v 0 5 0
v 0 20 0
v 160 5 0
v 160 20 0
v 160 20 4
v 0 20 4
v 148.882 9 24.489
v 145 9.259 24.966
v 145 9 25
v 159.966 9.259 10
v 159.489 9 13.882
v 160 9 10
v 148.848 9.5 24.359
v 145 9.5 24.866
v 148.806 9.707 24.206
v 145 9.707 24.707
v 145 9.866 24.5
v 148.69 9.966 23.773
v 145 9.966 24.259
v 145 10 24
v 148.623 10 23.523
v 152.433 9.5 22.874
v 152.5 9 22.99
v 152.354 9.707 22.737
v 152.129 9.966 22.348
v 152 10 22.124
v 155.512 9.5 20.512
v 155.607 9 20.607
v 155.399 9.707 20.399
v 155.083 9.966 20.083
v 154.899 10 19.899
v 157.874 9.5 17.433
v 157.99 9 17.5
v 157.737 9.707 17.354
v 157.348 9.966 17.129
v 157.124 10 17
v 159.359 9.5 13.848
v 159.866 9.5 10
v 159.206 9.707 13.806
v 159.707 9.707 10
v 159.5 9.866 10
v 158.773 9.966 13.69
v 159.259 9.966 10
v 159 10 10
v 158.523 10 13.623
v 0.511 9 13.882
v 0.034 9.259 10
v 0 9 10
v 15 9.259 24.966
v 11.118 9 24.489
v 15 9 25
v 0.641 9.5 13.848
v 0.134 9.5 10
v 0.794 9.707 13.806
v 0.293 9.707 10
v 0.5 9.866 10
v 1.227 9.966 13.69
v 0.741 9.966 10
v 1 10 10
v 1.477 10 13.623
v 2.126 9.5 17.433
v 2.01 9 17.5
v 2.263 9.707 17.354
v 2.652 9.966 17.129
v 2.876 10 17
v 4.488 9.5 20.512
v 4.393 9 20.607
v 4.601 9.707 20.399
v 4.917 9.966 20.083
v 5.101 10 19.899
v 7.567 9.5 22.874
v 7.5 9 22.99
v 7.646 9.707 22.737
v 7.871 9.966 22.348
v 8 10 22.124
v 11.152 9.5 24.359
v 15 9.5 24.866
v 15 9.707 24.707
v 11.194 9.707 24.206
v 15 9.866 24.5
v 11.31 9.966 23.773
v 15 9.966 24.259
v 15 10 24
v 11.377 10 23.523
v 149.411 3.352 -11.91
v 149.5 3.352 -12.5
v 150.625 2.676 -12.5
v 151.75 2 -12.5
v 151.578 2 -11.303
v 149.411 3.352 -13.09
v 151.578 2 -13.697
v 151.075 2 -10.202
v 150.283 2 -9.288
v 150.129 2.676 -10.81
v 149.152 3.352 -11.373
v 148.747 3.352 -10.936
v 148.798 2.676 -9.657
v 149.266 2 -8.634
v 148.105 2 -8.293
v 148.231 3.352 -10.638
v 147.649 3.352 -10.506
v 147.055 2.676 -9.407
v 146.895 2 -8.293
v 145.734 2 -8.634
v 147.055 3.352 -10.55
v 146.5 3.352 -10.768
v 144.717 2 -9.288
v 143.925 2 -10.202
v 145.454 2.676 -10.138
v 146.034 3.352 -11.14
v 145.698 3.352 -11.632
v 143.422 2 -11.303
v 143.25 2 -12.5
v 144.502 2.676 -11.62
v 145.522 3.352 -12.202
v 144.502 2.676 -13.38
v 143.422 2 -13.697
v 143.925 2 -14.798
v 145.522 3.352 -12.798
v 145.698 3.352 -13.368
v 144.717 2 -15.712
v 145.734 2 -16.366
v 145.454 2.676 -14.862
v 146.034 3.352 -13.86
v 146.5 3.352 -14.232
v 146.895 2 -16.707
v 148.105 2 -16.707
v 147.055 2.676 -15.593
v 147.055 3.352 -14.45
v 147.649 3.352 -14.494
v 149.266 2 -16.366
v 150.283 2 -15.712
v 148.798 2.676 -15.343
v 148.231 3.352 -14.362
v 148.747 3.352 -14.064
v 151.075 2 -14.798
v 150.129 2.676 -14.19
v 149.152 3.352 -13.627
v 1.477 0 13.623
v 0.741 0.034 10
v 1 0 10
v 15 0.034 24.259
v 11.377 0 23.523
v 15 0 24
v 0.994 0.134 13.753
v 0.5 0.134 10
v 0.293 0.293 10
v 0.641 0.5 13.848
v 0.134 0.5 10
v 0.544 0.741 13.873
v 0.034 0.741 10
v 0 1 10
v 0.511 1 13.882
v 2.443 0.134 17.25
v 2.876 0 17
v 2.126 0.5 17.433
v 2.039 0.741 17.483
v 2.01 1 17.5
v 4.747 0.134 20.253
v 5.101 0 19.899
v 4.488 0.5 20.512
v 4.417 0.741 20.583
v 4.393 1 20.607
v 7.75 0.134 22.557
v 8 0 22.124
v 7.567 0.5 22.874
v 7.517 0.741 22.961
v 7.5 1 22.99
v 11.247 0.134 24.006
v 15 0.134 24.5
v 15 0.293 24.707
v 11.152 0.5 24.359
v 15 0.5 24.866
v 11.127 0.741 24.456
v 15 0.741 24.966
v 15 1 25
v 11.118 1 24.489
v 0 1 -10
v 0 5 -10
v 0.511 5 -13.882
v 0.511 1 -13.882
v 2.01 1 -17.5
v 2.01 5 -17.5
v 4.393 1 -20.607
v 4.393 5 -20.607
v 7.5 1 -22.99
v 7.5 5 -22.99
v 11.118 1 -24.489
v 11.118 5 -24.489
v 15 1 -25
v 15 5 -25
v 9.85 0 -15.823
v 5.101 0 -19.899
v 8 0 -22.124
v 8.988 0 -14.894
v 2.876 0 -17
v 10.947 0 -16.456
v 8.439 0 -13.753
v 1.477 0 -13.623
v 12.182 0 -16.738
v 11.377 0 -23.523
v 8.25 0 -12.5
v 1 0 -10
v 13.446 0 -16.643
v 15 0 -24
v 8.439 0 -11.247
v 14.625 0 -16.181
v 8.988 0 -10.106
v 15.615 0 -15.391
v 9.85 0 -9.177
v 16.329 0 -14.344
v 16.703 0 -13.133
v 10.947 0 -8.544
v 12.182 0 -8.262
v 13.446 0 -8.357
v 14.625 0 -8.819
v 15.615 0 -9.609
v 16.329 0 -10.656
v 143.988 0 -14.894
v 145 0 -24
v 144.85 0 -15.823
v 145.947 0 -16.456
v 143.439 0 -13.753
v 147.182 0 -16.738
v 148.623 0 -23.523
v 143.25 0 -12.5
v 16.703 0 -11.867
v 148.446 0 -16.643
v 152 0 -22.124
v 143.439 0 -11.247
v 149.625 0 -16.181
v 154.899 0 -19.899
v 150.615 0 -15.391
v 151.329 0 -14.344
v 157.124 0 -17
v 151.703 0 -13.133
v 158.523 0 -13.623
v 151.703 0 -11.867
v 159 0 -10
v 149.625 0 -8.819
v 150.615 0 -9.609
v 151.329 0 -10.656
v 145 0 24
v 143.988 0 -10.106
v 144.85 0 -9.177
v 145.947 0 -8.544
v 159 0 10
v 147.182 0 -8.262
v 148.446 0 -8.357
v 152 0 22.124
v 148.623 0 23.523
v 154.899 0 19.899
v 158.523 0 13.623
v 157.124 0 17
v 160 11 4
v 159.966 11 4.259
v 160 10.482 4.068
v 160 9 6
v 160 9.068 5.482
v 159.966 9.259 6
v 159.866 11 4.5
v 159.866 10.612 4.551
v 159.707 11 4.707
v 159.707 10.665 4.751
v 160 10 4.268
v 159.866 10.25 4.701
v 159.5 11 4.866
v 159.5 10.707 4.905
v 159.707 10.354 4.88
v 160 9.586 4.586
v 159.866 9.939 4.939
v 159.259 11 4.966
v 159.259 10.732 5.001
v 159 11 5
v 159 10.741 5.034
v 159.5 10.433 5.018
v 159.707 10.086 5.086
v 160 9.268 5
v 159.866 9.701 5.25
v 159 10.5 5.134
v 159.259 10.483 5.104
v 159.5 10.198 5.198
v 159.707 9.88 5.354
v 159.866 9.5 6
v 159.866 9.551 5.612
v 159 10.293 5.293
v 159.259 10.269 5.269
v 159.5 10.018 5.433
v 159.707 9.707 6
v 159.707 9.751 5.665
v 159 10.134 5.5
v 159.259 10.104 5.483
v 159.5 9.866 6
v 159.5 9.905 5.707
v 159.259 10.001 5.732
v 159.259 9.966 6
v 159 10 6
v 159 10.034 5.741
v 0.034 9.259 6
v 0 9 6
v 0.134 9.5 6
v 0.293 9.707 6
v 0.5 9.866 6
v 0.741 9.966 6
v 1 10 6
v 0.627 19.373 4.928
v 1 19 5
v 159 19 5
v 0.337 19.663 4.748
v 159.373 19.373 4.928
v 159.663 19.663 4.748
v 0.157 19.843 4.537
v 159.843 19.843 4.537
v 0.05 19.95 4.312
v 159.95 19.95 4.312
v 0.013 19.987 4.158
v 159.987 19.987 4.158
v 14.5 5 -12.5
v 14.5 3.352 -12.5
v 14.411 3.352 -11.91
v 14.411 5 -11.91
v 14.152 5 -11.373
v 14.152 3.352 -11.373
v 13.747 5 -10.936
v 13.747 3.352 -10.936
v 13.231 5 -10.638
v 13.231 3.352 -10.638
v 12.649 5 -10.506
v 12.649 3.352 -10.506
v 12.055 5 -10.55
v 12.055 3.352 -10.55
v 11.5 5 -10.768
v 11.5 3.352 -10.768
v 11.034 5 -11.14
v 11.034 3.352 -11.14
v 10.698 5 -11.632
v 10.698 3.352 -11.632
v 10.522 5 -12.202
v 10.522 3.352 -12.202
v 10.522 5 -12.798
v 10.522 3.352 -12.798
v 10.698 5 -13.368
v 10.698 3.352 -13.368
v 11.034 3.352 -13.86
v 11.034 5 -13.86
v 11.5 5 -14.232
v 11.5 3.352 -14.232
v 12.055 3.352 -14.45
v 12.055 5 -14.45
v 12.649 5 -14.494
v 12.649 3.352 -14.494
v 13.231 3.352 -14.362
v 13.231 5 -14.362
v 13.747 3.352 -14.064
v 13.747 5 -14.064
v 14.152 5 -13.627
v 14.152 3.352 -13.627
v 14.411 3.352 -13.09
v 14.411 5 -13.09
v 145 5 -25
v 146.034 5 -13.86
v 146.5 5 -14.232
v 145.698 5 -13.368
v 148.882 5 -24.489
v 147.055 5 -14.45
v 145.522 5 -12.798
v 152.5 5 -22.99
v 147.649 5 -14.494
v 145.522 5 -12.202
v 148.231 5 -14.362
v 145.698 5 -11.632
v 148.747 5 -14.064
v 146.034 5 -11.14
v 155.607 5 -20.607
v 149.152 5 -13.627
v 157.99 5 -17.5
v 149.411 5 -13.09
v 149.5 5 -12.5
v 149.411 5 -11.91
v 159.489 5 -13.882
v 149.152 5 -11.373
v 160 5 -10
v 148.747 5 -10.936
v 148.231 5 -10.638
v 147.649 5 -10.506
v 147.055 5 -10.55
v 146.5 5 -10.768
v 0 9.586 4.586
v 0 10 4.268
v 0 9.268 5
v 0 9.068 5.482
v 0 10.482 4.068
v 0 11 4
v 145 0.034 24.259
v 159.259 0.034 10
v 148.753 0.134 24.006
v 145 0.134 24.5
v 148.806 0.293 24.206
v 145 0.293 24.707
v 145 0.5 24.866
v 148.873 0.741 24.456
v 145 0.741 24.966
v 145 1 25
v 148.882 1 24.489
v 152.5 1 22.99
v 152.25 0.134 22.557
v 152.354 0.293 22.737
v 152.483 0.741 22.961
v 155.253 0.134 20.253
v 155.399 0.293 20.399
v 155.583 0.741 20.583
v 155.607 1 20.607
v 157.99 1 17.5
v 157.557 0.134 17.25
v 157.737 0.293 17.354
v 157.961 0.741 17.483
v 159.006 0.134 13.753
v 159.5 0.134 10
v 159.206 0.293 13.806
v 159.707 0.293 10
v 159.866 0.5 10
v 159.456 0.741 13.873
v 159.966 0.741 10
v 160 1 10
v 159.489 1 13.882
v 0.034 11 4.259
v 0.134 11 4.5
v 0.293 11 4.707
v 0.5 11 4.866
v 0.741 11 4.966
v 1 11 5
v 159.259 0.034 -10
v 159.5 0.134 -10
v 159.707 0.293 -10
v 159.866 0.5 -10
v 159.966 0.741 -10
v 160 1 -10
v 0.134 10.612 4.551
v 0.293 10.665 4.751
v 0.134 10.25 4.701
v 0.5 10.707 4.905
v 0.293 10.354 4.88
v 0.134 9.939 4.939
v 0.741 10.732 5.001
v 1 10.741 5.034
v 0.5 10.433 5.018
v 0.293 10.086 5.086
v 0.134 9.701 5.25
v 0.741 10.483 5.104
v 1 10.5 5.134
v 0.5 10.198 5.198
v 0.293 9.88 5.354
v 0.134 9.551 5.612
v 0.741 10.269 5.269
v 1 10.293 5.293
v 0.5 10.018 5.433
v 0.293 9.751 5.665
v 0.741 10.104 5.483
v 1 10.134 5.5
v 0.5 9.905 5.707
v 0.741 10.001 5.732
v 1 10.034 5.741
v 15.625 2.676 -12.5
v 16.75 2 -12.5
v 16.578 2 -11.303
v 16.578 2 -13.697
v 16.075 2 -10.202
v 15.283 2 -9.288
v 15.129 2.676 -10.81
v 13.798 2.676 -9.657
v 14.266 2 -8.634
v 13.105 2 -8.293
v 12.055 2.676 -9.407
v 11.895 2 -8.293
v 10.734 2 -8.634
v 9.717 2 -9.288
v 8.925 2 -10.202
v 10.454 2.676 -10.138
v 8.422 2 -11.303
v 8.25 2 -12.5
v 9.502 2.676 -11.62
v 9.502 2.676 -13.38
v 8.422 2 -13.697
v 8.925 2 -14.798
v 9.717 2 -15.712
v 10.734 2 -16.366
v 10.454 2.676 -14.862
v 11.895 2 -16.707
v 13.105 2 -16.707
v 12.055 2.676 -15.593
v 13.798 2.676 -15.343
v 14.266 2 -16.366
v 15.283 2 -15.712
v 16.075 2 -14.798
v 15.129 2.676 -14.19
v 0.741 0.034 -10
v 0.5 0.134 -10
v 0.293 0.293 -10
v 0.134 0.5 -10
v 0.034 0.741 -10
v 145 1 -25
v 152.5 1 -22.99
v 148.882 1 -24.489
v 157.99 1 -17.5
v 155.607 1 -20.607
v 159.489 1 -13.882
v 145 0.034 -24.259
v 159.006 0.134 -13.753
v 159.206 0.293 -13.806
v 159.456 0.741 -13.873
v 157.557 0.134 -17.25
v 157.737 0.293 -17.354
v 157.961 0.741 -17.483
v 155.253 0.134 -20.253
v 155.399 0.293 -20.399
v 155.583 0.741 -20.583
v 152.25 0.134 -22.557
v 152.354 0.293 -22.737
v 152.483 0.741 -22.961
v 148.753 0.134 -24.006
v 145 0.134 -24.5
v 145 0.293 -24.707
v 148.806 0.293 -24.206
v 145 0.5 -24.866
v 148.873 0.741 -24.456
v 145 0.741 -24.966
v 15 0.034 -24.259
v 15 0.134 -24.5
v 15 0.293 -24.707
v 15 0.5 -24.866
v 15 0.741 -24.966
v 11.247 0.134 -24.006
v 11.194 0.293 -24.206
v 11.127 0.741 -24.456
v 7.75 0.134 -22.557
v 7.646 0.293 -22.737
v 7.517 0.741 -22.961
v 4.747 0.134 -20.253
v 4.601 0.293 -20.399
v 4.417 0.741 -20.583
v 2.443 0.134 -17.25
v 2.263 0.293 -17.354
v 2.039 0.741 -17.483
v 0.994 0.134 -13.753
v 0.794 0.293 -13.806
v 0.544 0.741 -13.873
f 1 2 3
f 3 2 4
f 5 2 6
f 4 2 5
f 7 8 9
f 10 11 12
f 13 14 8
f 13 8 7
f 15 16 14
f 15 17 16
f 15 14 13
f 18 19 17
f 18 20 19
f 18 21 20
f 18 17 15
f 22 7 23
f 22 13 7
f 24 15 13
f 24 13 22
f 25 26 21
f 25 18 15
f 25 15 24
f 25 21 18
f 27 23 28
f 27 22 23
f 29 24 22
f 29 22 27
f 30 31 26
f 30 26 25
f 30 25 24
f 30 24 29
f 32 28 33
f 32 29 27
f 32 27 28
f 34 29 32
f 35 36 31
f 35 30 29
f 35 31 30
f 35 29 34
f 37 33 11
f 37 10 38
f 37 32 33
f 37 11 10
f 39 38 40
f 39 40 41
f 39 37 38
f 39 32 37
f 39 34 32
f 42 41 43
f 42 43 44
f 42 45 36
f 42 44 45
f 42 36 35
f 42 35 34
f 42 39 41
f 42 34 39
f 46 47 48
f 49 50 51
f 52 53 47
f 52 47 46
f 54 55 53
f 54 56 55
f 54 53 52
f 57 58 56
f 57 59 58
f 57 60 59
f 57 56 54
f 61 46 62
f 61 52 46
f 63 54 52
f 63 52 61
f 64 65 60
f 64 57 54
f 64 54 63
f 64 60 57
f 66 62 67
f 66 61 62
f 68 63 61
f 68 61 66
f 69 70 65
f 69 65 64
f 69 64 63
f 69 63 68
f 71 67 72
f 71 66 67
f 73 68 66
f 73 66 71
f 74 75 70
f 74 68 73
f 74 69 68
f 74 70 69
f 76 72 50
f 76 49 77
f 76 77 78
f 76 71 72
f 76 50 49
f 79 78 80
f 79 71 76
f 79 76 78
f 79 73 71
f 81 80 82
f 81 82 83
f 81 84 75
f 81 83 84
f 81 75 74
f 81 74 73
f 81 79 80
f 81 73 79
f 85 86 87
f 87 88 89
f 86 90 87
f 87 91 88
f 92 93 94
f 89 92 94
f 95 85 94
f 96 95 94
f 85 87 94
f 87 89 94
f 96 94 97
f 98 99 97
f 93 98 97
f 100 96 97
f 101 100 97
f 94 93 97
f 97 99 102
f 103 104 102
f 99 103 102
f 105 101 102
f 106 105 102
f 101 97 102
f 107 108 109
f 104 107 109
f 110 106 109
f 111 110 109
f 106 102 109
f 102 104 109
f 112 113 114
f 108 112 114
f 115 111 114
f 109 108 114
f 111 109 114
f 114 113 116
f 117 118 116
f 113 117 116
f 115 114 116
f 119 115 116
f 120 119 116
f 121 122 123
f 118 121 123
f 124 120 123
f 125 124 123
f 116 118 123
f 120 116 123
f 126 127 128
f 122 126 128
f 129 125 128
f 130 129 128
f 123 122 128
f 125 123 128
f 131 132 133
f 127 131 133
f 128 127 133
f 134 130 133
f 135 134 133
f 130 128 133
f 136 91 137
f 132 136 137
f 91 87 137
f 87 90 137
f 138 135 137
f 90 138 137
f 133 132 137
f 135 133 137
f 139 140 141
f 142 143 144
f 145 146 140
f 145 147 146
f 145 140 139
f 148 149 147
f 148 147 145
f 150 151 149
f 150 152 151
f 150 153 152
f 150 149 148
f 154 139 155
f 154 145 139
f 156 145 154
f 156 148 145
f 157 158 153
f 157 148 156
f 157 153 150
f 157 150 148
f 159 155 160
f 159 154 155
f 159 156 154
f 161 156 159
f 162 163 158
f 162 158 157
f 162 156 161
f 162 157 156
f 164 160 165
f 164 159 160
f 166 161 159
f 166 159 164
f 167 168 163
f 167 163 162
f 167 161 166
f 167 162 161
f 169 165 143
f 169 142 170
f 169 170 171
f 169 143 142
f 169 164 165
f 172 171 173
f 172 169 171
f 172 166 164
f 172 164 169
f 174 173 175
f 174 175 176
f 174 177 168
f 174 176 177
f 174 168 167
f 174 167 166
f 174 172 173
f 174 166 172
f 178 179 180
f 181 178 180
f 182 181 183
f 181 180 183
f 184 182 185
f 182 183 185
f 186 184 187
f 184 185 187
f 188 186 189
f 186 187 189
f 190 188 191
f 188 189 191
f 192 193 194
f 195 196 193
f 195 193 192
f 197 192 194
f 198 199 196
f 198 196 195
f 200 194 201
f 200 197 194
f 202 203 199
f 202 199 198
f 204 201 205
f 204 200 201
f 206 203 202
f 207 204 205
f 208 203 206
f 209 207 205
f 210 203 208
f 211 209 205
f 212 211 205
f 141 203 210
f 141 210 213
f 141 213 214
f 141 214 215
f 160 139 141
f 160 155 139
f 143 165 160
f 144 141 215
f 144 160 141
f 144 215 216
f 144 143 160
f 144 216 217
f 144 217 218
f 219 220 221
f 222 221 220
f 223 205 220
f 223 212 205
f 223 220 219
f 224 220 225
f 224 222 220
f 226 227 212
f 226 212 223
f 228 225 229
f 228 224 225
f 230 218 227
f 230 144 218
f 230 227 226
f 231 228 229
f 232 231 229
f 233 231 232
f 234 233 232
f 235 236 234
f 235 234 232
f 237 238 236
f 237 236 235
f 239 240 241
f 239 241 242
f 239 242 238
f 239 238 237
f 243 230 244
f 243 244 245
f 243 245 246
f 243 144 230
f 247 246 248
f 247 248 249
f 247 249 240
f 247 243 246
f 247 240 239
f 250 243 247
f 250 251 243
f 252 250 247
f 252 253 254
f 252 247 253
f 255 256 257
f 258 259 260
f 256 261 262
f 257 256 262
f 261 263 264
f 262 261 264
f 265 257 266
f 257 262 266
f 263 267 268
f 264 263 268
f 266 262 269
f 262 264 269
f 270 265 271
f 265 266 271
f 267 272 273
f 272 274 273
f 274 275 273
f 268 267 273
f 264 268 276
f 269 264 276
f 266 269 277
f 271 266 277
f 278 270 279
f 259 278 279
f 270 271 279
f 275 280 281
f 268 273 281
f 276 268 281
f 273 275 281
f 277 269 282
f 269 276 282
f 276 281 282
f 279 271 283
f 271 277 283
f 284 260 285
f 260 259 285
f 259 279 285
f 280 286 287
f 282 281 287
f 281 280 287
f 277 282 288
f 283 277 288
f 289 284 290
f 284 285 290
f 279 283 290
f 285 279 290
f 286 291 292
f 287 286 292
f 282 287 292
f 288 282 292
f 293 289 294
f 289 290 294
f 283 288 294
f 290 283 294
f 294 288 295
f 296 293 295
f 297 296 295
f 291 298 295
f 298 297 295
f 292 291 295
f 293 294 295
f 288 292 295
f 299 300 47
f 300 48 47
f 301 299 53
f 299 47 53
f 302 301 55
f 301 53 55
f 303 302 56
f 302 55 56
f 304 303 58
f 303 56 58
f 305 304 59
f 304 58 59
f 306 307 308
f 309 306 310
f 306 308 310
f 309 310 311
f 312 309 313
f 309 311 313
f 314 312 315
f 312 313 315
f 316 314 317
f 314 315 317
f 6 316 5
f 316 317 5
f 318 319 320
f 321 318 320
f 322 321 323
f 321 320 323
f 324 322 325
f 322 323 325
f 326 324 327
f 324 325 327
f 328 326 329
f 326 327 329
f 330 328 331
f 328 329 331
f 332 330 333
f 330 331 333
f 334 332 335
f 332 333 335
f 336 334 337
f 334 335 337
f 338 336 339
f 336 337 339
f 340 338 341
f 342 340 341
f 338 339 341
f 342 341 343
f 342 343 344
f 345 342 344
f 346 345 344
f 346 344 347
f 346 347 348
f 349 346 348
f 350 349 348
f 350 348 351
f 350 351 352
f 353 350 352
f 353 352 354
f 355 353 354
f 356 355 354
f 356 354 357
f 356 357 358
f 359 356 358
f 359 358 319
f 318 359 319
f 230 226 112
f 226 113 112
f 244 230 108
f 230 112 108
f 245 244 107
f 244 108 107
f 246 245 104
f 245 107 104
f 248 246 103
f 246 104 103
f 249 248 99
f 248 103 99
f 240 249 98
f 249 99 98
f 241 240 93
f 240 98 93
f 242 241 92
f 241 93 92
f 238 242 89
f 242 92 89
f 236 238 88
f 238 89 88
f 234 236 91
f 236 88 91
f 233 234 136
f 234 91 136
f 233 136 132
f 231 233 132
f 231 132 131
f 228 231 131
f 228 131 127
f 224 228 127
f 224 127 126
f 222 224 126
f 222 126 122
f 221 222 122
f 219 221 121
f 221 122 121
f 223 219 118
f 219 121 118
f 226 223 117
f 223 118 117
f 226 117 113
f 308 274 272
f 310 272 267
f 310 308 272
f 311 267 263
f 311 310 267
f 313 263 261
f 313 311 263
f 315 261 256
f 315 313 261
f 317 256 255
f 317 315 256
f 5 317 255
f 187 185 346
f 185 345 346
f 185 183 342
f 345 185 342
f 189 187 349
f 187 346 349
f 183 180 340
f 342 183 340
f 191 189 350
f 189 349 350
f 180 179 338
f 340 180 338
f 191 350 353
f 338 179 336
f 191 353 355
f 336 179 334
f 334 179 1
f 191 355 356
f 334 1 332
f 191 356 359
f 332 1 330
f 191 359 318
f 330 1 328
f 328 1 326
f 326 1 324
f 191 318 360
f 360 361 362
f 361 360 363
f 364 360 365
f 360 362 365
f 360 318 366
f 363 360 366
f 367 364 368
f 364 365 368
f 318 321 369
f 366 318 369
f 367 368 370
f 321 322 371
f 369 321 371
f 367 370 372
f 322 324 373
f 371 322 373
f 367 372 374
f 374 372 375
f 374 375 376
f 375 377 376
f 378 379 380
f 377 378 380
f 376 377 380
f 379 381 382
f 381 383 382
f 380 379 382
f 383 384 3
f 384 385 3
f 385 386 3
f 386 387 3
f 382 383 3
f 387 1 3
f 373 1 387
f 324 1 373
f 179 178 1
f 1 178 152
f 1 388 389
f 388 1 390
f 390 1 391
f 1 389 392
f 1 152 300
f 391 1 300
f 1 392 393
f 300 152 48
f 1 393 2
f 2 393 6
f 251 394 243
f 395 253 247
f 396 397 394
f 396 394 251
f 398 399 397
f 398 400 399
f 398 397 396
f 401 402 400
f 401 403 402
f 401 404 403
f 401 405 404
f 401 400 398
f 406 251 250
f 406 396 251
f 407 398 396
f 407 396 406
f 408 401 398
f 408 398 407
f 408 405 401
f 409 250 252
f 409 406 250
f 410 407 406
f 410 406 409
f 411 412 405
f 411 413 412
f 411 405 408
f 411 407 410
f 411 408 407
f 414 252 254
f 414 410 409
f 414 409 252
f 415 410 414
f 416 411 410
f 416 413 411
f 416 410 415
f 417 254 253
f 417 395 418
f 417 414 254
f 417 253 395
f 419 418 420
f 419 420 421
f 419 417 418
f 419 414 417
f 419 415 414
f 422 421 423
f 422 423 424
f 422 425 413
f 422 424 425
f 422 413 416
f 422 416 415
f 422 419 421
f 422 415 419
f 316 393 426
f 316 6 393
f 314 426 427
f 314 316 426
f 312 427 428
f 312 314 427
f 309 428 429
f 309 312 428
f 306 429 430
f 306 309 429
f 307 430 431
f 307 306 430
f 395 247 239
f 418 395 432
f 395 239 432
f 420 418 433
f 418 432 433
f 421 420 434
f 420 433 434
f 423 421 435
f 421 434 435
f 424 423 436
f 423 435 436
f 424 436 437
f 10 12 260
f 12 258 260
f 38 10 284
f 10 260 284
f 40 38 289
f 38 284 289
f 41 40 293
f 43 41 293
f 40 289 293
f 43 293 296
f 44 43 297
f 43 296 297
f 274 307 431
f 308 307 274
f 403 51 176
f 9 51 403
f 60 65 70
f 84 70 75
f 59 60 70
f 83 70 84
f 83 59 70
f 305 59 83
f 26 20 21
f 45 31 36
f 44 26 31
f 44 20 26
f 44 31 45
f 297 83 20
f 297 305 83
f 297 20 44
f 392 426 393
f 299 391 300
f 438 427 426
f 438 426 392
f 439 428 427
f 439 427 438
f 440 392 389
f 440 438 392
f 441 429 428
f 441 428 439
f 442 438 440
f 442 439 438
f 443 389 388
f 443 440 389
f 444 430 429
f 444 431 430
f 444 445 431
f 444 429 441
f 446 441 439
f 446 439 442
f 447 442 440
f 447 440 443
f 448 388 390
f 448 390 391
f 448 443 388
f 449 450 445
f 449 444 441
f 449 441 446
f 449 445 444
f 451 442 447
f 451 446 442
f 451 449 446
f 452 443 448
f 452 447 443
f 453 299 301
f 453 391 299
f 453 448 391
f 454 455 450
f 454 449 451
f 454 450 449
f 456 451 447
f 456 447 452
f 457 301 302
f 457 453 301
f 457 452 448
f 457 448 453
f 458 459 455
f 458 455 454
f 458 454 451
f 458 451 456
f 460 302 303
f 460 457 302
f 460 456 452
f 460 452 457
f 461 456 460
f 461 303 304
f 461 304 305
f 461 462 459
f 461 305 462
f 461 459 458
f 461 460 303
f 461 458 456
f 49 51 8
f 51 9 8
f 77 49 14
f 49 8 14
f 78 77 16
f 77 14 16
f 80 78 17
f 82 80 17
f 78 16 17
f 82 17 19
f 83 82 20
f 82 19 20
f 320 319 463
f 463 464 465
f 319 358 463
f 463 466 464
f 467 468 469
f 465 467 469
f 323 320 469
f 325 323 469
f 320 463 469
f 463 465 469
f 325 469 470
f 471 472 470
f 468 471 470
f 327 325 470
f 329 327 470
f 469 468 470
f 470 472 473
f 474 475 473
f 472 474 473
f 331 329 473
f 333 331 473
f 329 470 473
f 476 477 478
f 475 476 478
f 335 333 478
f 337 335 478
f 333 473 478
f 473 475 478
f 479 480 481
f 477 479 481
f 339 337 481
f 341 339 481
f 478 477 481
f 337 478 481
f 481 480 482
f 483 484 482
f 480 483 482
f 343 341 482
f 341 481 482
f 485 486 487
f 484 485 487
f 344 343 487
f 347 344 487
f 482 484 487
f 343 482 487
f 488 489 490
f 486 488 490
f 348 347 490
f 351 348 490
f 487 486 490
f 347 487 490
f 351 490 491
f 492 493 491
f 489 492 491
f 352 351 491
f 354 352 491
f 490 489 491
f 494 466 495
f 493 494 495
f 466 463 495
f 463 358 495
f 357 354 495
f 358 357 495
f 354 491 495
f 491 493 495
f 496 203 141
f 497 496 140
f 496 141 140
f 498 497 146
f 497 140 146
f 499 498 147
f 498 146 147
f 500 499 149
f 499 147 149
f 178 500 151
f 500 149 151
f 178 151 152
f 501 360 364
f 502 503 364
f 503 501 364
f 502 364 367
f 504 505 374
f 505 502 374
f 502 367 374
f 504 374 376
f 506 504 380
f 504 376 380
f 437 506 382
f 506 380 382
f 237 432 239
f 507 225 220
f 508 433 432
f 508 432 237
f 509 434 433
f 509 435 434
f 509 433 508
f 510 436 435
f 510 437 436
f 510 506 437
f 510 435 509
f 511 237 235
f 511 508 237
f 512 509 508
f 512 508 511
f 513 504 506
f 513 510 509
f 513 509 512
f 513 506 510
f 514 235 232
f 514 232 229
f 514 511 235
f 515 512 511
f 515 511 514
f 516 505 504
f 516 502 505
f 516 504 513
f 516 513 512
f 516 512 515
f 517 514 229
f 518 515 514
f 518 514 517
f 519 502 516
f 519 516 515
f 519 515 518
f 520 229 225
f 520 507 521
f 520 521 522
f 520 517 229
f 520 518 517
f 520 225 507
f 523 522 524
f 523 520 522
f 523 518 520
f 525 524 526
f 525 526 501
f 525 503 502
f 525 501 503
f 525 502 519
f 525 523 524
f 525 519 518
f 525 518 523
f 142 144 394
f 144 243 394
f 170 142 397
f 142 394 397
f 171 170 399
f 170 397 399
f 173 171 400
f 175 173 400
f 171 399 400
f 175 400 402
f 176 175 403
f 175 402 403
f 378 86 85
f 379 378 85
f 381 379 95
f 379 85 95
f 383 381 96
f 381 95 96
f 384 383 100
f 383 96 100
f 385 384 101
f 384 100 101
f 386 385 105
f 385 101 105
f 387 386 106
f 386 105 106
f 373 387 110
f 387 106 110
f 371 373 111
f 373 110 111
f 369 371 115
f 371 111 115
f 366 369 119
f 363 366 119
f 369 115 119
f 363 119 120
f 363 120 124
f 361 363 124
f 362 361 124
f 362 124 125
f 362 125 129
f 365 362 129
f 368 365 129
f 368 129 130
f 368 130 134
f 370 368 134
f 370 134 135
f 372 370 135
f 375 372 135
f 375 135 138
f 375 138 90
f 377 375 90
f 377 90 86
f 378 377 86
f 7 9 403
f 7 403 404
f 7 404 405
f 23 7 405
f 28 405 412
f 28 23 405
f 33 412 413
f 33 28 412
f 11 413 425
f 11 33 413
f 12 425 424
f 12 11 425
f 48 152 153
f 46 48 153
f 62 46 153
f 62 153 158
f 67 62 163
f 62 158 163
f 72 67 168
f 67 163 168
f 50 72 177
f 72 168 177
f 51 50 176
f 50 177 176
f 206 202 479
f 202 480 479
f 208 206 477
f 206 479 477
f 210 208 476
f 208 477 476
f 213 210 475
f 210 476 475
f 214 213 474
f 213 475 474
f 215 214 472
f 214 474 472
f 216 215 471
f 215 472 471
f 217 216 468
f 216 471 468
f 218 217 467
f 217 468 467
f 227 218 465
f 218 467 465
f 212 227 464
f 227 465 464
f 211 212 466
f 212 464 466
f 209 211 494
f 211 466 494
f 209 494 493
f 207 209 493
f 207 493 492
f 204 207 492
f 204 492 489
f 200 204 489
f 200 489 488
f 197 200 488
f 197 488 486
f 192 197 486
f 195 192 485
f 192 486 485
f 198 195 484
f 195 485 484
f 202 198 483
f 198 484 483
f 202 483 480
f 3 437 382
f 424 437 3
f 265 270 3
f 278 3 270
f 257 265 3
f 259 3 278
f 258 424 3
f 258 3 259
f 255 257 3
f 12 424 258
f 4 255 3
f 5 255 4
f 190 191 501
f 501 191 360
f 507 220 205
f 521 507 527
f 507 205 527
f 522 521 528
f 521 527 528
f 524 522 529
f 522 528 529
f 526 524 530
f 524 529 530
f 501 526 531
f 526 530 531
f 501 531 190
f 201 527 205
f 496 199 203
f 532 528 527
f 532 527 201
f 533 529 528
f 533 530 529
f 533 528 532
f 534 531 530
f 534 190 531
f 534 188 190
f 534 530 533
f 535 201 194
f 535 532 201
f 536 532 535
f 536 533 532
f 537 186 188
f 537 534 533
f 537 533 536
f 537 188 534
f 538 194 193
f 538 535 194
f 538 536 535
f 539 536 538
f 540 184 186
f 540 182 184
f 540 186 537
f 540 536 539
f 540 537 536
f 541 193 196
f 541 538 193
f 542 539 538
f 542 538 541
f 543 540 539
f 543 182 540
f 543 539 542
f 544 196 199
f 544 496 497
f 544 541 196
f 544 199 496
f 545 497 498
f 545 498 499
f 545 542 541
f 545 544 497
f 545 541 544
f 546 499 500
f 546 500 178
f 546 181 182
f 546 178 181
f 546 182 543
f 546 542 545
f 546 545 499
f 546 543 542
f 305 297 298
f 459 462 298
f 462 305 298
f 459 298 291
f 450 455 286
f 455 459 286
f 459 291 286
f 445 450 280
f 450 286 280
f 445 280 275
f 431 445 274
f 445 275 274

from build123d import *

# Parameters (mm, degrees)
F0_W     = 160
F0_H     = 5
F1_DEPTH = 25
F0_H_2   = 10
F2_DEPTH = 5
F3_DEPTH = 25
F4_R     = 2
F5_DEPTH = 5
F6_D     = 8.5
F6_DEPTH = 2
F6_TIP   = 2.5536576309
F7_R     = 15
F8_R     = 1


with BuildPart() as f1:
    # F0 (on Top) → F1 (new body)
    with BuildSketch(Plane.XY):
        with Locations((80, 2.5)):
            Rectangle(F0_W, F0_H)
        with Locations((80, 7.5)):
            Rectangle(F0_W, F0_H)
    extrude(amount=F1_DEPTH)

    # F0 (on Top) → F2 (join)
    with BuildSketch(Plane.XY):
        with Locations((80, 15)):
            Rectangle(F0_W, F0_H_2)
    extrude(amount=F2_DEPTH)

    # F0 (on Top) → F3 (join)
    with BuildSketch(Plane.XY):
        with Locations((80, 2.5)):
            Rectangle(F0_W, F0_H)
    extrude(amount=-F3_DEPTH)

    # F4 (on face) → F5 (cut, through all)
    with BuildSketch(Plane.XZ):
        with Locations((12.5, -12.5)):
            Circle(F4_R)
        with Locations((147.5, -12.5)):
            Circle(F4_R)
    extrude(amount=-F5_DEPTH, mode=Mode.SUBTRACT)

    # F6
    with Locations(Plane.XZ):
        with Locations((12.5, -12.5), (147.5, -12.5)):
            Hole(F6_D / 2, depth=F6_DEPTH)
            with Locations((0, 0, -(F6_DEPTH + F6_TIP / 2))):  # 118° drill point
                Cone(0, F6_D / 2, F6_TIP, mode=Mode.SUBTRACT)

    # F7
    f7_edges = [f1.edges().sort_by_distance(p)[0] for p in [
        (160, 2.5, -25),
        (0, 2.5, -25),
        (160, 5, 25),
        (0, 5, 25),
    ]]
    fillet(f7_edges, radius=F7_R)

    # F8
    f8_edges = [f1.edges().sort_by_distance(p)[0] for p in [
        (0, 10, 7.5),
        (4.393398, 10, 20.606602),
        (80, 10, 5),
        (80, 10, 25),
        (160, 10, 7.5),
        (155.606602, 10, 20.606602),
        (80, 0, 25),
        (80, 20, 5),
        (0, 0, 0),
        (4.393398, 0, 20.606602),
        (4.393398, 0, -20.606602),
        (80, 0, -25),
        (155.606602, 0, 20.606602),
        (155.606602, 0, -20.606602),
        (160, 0, 0),
        (0, 15, 5),
        (160, 15, 5),
    ]]
    fillet(f8_edges, radius=F8_R)


solid = f1.part
